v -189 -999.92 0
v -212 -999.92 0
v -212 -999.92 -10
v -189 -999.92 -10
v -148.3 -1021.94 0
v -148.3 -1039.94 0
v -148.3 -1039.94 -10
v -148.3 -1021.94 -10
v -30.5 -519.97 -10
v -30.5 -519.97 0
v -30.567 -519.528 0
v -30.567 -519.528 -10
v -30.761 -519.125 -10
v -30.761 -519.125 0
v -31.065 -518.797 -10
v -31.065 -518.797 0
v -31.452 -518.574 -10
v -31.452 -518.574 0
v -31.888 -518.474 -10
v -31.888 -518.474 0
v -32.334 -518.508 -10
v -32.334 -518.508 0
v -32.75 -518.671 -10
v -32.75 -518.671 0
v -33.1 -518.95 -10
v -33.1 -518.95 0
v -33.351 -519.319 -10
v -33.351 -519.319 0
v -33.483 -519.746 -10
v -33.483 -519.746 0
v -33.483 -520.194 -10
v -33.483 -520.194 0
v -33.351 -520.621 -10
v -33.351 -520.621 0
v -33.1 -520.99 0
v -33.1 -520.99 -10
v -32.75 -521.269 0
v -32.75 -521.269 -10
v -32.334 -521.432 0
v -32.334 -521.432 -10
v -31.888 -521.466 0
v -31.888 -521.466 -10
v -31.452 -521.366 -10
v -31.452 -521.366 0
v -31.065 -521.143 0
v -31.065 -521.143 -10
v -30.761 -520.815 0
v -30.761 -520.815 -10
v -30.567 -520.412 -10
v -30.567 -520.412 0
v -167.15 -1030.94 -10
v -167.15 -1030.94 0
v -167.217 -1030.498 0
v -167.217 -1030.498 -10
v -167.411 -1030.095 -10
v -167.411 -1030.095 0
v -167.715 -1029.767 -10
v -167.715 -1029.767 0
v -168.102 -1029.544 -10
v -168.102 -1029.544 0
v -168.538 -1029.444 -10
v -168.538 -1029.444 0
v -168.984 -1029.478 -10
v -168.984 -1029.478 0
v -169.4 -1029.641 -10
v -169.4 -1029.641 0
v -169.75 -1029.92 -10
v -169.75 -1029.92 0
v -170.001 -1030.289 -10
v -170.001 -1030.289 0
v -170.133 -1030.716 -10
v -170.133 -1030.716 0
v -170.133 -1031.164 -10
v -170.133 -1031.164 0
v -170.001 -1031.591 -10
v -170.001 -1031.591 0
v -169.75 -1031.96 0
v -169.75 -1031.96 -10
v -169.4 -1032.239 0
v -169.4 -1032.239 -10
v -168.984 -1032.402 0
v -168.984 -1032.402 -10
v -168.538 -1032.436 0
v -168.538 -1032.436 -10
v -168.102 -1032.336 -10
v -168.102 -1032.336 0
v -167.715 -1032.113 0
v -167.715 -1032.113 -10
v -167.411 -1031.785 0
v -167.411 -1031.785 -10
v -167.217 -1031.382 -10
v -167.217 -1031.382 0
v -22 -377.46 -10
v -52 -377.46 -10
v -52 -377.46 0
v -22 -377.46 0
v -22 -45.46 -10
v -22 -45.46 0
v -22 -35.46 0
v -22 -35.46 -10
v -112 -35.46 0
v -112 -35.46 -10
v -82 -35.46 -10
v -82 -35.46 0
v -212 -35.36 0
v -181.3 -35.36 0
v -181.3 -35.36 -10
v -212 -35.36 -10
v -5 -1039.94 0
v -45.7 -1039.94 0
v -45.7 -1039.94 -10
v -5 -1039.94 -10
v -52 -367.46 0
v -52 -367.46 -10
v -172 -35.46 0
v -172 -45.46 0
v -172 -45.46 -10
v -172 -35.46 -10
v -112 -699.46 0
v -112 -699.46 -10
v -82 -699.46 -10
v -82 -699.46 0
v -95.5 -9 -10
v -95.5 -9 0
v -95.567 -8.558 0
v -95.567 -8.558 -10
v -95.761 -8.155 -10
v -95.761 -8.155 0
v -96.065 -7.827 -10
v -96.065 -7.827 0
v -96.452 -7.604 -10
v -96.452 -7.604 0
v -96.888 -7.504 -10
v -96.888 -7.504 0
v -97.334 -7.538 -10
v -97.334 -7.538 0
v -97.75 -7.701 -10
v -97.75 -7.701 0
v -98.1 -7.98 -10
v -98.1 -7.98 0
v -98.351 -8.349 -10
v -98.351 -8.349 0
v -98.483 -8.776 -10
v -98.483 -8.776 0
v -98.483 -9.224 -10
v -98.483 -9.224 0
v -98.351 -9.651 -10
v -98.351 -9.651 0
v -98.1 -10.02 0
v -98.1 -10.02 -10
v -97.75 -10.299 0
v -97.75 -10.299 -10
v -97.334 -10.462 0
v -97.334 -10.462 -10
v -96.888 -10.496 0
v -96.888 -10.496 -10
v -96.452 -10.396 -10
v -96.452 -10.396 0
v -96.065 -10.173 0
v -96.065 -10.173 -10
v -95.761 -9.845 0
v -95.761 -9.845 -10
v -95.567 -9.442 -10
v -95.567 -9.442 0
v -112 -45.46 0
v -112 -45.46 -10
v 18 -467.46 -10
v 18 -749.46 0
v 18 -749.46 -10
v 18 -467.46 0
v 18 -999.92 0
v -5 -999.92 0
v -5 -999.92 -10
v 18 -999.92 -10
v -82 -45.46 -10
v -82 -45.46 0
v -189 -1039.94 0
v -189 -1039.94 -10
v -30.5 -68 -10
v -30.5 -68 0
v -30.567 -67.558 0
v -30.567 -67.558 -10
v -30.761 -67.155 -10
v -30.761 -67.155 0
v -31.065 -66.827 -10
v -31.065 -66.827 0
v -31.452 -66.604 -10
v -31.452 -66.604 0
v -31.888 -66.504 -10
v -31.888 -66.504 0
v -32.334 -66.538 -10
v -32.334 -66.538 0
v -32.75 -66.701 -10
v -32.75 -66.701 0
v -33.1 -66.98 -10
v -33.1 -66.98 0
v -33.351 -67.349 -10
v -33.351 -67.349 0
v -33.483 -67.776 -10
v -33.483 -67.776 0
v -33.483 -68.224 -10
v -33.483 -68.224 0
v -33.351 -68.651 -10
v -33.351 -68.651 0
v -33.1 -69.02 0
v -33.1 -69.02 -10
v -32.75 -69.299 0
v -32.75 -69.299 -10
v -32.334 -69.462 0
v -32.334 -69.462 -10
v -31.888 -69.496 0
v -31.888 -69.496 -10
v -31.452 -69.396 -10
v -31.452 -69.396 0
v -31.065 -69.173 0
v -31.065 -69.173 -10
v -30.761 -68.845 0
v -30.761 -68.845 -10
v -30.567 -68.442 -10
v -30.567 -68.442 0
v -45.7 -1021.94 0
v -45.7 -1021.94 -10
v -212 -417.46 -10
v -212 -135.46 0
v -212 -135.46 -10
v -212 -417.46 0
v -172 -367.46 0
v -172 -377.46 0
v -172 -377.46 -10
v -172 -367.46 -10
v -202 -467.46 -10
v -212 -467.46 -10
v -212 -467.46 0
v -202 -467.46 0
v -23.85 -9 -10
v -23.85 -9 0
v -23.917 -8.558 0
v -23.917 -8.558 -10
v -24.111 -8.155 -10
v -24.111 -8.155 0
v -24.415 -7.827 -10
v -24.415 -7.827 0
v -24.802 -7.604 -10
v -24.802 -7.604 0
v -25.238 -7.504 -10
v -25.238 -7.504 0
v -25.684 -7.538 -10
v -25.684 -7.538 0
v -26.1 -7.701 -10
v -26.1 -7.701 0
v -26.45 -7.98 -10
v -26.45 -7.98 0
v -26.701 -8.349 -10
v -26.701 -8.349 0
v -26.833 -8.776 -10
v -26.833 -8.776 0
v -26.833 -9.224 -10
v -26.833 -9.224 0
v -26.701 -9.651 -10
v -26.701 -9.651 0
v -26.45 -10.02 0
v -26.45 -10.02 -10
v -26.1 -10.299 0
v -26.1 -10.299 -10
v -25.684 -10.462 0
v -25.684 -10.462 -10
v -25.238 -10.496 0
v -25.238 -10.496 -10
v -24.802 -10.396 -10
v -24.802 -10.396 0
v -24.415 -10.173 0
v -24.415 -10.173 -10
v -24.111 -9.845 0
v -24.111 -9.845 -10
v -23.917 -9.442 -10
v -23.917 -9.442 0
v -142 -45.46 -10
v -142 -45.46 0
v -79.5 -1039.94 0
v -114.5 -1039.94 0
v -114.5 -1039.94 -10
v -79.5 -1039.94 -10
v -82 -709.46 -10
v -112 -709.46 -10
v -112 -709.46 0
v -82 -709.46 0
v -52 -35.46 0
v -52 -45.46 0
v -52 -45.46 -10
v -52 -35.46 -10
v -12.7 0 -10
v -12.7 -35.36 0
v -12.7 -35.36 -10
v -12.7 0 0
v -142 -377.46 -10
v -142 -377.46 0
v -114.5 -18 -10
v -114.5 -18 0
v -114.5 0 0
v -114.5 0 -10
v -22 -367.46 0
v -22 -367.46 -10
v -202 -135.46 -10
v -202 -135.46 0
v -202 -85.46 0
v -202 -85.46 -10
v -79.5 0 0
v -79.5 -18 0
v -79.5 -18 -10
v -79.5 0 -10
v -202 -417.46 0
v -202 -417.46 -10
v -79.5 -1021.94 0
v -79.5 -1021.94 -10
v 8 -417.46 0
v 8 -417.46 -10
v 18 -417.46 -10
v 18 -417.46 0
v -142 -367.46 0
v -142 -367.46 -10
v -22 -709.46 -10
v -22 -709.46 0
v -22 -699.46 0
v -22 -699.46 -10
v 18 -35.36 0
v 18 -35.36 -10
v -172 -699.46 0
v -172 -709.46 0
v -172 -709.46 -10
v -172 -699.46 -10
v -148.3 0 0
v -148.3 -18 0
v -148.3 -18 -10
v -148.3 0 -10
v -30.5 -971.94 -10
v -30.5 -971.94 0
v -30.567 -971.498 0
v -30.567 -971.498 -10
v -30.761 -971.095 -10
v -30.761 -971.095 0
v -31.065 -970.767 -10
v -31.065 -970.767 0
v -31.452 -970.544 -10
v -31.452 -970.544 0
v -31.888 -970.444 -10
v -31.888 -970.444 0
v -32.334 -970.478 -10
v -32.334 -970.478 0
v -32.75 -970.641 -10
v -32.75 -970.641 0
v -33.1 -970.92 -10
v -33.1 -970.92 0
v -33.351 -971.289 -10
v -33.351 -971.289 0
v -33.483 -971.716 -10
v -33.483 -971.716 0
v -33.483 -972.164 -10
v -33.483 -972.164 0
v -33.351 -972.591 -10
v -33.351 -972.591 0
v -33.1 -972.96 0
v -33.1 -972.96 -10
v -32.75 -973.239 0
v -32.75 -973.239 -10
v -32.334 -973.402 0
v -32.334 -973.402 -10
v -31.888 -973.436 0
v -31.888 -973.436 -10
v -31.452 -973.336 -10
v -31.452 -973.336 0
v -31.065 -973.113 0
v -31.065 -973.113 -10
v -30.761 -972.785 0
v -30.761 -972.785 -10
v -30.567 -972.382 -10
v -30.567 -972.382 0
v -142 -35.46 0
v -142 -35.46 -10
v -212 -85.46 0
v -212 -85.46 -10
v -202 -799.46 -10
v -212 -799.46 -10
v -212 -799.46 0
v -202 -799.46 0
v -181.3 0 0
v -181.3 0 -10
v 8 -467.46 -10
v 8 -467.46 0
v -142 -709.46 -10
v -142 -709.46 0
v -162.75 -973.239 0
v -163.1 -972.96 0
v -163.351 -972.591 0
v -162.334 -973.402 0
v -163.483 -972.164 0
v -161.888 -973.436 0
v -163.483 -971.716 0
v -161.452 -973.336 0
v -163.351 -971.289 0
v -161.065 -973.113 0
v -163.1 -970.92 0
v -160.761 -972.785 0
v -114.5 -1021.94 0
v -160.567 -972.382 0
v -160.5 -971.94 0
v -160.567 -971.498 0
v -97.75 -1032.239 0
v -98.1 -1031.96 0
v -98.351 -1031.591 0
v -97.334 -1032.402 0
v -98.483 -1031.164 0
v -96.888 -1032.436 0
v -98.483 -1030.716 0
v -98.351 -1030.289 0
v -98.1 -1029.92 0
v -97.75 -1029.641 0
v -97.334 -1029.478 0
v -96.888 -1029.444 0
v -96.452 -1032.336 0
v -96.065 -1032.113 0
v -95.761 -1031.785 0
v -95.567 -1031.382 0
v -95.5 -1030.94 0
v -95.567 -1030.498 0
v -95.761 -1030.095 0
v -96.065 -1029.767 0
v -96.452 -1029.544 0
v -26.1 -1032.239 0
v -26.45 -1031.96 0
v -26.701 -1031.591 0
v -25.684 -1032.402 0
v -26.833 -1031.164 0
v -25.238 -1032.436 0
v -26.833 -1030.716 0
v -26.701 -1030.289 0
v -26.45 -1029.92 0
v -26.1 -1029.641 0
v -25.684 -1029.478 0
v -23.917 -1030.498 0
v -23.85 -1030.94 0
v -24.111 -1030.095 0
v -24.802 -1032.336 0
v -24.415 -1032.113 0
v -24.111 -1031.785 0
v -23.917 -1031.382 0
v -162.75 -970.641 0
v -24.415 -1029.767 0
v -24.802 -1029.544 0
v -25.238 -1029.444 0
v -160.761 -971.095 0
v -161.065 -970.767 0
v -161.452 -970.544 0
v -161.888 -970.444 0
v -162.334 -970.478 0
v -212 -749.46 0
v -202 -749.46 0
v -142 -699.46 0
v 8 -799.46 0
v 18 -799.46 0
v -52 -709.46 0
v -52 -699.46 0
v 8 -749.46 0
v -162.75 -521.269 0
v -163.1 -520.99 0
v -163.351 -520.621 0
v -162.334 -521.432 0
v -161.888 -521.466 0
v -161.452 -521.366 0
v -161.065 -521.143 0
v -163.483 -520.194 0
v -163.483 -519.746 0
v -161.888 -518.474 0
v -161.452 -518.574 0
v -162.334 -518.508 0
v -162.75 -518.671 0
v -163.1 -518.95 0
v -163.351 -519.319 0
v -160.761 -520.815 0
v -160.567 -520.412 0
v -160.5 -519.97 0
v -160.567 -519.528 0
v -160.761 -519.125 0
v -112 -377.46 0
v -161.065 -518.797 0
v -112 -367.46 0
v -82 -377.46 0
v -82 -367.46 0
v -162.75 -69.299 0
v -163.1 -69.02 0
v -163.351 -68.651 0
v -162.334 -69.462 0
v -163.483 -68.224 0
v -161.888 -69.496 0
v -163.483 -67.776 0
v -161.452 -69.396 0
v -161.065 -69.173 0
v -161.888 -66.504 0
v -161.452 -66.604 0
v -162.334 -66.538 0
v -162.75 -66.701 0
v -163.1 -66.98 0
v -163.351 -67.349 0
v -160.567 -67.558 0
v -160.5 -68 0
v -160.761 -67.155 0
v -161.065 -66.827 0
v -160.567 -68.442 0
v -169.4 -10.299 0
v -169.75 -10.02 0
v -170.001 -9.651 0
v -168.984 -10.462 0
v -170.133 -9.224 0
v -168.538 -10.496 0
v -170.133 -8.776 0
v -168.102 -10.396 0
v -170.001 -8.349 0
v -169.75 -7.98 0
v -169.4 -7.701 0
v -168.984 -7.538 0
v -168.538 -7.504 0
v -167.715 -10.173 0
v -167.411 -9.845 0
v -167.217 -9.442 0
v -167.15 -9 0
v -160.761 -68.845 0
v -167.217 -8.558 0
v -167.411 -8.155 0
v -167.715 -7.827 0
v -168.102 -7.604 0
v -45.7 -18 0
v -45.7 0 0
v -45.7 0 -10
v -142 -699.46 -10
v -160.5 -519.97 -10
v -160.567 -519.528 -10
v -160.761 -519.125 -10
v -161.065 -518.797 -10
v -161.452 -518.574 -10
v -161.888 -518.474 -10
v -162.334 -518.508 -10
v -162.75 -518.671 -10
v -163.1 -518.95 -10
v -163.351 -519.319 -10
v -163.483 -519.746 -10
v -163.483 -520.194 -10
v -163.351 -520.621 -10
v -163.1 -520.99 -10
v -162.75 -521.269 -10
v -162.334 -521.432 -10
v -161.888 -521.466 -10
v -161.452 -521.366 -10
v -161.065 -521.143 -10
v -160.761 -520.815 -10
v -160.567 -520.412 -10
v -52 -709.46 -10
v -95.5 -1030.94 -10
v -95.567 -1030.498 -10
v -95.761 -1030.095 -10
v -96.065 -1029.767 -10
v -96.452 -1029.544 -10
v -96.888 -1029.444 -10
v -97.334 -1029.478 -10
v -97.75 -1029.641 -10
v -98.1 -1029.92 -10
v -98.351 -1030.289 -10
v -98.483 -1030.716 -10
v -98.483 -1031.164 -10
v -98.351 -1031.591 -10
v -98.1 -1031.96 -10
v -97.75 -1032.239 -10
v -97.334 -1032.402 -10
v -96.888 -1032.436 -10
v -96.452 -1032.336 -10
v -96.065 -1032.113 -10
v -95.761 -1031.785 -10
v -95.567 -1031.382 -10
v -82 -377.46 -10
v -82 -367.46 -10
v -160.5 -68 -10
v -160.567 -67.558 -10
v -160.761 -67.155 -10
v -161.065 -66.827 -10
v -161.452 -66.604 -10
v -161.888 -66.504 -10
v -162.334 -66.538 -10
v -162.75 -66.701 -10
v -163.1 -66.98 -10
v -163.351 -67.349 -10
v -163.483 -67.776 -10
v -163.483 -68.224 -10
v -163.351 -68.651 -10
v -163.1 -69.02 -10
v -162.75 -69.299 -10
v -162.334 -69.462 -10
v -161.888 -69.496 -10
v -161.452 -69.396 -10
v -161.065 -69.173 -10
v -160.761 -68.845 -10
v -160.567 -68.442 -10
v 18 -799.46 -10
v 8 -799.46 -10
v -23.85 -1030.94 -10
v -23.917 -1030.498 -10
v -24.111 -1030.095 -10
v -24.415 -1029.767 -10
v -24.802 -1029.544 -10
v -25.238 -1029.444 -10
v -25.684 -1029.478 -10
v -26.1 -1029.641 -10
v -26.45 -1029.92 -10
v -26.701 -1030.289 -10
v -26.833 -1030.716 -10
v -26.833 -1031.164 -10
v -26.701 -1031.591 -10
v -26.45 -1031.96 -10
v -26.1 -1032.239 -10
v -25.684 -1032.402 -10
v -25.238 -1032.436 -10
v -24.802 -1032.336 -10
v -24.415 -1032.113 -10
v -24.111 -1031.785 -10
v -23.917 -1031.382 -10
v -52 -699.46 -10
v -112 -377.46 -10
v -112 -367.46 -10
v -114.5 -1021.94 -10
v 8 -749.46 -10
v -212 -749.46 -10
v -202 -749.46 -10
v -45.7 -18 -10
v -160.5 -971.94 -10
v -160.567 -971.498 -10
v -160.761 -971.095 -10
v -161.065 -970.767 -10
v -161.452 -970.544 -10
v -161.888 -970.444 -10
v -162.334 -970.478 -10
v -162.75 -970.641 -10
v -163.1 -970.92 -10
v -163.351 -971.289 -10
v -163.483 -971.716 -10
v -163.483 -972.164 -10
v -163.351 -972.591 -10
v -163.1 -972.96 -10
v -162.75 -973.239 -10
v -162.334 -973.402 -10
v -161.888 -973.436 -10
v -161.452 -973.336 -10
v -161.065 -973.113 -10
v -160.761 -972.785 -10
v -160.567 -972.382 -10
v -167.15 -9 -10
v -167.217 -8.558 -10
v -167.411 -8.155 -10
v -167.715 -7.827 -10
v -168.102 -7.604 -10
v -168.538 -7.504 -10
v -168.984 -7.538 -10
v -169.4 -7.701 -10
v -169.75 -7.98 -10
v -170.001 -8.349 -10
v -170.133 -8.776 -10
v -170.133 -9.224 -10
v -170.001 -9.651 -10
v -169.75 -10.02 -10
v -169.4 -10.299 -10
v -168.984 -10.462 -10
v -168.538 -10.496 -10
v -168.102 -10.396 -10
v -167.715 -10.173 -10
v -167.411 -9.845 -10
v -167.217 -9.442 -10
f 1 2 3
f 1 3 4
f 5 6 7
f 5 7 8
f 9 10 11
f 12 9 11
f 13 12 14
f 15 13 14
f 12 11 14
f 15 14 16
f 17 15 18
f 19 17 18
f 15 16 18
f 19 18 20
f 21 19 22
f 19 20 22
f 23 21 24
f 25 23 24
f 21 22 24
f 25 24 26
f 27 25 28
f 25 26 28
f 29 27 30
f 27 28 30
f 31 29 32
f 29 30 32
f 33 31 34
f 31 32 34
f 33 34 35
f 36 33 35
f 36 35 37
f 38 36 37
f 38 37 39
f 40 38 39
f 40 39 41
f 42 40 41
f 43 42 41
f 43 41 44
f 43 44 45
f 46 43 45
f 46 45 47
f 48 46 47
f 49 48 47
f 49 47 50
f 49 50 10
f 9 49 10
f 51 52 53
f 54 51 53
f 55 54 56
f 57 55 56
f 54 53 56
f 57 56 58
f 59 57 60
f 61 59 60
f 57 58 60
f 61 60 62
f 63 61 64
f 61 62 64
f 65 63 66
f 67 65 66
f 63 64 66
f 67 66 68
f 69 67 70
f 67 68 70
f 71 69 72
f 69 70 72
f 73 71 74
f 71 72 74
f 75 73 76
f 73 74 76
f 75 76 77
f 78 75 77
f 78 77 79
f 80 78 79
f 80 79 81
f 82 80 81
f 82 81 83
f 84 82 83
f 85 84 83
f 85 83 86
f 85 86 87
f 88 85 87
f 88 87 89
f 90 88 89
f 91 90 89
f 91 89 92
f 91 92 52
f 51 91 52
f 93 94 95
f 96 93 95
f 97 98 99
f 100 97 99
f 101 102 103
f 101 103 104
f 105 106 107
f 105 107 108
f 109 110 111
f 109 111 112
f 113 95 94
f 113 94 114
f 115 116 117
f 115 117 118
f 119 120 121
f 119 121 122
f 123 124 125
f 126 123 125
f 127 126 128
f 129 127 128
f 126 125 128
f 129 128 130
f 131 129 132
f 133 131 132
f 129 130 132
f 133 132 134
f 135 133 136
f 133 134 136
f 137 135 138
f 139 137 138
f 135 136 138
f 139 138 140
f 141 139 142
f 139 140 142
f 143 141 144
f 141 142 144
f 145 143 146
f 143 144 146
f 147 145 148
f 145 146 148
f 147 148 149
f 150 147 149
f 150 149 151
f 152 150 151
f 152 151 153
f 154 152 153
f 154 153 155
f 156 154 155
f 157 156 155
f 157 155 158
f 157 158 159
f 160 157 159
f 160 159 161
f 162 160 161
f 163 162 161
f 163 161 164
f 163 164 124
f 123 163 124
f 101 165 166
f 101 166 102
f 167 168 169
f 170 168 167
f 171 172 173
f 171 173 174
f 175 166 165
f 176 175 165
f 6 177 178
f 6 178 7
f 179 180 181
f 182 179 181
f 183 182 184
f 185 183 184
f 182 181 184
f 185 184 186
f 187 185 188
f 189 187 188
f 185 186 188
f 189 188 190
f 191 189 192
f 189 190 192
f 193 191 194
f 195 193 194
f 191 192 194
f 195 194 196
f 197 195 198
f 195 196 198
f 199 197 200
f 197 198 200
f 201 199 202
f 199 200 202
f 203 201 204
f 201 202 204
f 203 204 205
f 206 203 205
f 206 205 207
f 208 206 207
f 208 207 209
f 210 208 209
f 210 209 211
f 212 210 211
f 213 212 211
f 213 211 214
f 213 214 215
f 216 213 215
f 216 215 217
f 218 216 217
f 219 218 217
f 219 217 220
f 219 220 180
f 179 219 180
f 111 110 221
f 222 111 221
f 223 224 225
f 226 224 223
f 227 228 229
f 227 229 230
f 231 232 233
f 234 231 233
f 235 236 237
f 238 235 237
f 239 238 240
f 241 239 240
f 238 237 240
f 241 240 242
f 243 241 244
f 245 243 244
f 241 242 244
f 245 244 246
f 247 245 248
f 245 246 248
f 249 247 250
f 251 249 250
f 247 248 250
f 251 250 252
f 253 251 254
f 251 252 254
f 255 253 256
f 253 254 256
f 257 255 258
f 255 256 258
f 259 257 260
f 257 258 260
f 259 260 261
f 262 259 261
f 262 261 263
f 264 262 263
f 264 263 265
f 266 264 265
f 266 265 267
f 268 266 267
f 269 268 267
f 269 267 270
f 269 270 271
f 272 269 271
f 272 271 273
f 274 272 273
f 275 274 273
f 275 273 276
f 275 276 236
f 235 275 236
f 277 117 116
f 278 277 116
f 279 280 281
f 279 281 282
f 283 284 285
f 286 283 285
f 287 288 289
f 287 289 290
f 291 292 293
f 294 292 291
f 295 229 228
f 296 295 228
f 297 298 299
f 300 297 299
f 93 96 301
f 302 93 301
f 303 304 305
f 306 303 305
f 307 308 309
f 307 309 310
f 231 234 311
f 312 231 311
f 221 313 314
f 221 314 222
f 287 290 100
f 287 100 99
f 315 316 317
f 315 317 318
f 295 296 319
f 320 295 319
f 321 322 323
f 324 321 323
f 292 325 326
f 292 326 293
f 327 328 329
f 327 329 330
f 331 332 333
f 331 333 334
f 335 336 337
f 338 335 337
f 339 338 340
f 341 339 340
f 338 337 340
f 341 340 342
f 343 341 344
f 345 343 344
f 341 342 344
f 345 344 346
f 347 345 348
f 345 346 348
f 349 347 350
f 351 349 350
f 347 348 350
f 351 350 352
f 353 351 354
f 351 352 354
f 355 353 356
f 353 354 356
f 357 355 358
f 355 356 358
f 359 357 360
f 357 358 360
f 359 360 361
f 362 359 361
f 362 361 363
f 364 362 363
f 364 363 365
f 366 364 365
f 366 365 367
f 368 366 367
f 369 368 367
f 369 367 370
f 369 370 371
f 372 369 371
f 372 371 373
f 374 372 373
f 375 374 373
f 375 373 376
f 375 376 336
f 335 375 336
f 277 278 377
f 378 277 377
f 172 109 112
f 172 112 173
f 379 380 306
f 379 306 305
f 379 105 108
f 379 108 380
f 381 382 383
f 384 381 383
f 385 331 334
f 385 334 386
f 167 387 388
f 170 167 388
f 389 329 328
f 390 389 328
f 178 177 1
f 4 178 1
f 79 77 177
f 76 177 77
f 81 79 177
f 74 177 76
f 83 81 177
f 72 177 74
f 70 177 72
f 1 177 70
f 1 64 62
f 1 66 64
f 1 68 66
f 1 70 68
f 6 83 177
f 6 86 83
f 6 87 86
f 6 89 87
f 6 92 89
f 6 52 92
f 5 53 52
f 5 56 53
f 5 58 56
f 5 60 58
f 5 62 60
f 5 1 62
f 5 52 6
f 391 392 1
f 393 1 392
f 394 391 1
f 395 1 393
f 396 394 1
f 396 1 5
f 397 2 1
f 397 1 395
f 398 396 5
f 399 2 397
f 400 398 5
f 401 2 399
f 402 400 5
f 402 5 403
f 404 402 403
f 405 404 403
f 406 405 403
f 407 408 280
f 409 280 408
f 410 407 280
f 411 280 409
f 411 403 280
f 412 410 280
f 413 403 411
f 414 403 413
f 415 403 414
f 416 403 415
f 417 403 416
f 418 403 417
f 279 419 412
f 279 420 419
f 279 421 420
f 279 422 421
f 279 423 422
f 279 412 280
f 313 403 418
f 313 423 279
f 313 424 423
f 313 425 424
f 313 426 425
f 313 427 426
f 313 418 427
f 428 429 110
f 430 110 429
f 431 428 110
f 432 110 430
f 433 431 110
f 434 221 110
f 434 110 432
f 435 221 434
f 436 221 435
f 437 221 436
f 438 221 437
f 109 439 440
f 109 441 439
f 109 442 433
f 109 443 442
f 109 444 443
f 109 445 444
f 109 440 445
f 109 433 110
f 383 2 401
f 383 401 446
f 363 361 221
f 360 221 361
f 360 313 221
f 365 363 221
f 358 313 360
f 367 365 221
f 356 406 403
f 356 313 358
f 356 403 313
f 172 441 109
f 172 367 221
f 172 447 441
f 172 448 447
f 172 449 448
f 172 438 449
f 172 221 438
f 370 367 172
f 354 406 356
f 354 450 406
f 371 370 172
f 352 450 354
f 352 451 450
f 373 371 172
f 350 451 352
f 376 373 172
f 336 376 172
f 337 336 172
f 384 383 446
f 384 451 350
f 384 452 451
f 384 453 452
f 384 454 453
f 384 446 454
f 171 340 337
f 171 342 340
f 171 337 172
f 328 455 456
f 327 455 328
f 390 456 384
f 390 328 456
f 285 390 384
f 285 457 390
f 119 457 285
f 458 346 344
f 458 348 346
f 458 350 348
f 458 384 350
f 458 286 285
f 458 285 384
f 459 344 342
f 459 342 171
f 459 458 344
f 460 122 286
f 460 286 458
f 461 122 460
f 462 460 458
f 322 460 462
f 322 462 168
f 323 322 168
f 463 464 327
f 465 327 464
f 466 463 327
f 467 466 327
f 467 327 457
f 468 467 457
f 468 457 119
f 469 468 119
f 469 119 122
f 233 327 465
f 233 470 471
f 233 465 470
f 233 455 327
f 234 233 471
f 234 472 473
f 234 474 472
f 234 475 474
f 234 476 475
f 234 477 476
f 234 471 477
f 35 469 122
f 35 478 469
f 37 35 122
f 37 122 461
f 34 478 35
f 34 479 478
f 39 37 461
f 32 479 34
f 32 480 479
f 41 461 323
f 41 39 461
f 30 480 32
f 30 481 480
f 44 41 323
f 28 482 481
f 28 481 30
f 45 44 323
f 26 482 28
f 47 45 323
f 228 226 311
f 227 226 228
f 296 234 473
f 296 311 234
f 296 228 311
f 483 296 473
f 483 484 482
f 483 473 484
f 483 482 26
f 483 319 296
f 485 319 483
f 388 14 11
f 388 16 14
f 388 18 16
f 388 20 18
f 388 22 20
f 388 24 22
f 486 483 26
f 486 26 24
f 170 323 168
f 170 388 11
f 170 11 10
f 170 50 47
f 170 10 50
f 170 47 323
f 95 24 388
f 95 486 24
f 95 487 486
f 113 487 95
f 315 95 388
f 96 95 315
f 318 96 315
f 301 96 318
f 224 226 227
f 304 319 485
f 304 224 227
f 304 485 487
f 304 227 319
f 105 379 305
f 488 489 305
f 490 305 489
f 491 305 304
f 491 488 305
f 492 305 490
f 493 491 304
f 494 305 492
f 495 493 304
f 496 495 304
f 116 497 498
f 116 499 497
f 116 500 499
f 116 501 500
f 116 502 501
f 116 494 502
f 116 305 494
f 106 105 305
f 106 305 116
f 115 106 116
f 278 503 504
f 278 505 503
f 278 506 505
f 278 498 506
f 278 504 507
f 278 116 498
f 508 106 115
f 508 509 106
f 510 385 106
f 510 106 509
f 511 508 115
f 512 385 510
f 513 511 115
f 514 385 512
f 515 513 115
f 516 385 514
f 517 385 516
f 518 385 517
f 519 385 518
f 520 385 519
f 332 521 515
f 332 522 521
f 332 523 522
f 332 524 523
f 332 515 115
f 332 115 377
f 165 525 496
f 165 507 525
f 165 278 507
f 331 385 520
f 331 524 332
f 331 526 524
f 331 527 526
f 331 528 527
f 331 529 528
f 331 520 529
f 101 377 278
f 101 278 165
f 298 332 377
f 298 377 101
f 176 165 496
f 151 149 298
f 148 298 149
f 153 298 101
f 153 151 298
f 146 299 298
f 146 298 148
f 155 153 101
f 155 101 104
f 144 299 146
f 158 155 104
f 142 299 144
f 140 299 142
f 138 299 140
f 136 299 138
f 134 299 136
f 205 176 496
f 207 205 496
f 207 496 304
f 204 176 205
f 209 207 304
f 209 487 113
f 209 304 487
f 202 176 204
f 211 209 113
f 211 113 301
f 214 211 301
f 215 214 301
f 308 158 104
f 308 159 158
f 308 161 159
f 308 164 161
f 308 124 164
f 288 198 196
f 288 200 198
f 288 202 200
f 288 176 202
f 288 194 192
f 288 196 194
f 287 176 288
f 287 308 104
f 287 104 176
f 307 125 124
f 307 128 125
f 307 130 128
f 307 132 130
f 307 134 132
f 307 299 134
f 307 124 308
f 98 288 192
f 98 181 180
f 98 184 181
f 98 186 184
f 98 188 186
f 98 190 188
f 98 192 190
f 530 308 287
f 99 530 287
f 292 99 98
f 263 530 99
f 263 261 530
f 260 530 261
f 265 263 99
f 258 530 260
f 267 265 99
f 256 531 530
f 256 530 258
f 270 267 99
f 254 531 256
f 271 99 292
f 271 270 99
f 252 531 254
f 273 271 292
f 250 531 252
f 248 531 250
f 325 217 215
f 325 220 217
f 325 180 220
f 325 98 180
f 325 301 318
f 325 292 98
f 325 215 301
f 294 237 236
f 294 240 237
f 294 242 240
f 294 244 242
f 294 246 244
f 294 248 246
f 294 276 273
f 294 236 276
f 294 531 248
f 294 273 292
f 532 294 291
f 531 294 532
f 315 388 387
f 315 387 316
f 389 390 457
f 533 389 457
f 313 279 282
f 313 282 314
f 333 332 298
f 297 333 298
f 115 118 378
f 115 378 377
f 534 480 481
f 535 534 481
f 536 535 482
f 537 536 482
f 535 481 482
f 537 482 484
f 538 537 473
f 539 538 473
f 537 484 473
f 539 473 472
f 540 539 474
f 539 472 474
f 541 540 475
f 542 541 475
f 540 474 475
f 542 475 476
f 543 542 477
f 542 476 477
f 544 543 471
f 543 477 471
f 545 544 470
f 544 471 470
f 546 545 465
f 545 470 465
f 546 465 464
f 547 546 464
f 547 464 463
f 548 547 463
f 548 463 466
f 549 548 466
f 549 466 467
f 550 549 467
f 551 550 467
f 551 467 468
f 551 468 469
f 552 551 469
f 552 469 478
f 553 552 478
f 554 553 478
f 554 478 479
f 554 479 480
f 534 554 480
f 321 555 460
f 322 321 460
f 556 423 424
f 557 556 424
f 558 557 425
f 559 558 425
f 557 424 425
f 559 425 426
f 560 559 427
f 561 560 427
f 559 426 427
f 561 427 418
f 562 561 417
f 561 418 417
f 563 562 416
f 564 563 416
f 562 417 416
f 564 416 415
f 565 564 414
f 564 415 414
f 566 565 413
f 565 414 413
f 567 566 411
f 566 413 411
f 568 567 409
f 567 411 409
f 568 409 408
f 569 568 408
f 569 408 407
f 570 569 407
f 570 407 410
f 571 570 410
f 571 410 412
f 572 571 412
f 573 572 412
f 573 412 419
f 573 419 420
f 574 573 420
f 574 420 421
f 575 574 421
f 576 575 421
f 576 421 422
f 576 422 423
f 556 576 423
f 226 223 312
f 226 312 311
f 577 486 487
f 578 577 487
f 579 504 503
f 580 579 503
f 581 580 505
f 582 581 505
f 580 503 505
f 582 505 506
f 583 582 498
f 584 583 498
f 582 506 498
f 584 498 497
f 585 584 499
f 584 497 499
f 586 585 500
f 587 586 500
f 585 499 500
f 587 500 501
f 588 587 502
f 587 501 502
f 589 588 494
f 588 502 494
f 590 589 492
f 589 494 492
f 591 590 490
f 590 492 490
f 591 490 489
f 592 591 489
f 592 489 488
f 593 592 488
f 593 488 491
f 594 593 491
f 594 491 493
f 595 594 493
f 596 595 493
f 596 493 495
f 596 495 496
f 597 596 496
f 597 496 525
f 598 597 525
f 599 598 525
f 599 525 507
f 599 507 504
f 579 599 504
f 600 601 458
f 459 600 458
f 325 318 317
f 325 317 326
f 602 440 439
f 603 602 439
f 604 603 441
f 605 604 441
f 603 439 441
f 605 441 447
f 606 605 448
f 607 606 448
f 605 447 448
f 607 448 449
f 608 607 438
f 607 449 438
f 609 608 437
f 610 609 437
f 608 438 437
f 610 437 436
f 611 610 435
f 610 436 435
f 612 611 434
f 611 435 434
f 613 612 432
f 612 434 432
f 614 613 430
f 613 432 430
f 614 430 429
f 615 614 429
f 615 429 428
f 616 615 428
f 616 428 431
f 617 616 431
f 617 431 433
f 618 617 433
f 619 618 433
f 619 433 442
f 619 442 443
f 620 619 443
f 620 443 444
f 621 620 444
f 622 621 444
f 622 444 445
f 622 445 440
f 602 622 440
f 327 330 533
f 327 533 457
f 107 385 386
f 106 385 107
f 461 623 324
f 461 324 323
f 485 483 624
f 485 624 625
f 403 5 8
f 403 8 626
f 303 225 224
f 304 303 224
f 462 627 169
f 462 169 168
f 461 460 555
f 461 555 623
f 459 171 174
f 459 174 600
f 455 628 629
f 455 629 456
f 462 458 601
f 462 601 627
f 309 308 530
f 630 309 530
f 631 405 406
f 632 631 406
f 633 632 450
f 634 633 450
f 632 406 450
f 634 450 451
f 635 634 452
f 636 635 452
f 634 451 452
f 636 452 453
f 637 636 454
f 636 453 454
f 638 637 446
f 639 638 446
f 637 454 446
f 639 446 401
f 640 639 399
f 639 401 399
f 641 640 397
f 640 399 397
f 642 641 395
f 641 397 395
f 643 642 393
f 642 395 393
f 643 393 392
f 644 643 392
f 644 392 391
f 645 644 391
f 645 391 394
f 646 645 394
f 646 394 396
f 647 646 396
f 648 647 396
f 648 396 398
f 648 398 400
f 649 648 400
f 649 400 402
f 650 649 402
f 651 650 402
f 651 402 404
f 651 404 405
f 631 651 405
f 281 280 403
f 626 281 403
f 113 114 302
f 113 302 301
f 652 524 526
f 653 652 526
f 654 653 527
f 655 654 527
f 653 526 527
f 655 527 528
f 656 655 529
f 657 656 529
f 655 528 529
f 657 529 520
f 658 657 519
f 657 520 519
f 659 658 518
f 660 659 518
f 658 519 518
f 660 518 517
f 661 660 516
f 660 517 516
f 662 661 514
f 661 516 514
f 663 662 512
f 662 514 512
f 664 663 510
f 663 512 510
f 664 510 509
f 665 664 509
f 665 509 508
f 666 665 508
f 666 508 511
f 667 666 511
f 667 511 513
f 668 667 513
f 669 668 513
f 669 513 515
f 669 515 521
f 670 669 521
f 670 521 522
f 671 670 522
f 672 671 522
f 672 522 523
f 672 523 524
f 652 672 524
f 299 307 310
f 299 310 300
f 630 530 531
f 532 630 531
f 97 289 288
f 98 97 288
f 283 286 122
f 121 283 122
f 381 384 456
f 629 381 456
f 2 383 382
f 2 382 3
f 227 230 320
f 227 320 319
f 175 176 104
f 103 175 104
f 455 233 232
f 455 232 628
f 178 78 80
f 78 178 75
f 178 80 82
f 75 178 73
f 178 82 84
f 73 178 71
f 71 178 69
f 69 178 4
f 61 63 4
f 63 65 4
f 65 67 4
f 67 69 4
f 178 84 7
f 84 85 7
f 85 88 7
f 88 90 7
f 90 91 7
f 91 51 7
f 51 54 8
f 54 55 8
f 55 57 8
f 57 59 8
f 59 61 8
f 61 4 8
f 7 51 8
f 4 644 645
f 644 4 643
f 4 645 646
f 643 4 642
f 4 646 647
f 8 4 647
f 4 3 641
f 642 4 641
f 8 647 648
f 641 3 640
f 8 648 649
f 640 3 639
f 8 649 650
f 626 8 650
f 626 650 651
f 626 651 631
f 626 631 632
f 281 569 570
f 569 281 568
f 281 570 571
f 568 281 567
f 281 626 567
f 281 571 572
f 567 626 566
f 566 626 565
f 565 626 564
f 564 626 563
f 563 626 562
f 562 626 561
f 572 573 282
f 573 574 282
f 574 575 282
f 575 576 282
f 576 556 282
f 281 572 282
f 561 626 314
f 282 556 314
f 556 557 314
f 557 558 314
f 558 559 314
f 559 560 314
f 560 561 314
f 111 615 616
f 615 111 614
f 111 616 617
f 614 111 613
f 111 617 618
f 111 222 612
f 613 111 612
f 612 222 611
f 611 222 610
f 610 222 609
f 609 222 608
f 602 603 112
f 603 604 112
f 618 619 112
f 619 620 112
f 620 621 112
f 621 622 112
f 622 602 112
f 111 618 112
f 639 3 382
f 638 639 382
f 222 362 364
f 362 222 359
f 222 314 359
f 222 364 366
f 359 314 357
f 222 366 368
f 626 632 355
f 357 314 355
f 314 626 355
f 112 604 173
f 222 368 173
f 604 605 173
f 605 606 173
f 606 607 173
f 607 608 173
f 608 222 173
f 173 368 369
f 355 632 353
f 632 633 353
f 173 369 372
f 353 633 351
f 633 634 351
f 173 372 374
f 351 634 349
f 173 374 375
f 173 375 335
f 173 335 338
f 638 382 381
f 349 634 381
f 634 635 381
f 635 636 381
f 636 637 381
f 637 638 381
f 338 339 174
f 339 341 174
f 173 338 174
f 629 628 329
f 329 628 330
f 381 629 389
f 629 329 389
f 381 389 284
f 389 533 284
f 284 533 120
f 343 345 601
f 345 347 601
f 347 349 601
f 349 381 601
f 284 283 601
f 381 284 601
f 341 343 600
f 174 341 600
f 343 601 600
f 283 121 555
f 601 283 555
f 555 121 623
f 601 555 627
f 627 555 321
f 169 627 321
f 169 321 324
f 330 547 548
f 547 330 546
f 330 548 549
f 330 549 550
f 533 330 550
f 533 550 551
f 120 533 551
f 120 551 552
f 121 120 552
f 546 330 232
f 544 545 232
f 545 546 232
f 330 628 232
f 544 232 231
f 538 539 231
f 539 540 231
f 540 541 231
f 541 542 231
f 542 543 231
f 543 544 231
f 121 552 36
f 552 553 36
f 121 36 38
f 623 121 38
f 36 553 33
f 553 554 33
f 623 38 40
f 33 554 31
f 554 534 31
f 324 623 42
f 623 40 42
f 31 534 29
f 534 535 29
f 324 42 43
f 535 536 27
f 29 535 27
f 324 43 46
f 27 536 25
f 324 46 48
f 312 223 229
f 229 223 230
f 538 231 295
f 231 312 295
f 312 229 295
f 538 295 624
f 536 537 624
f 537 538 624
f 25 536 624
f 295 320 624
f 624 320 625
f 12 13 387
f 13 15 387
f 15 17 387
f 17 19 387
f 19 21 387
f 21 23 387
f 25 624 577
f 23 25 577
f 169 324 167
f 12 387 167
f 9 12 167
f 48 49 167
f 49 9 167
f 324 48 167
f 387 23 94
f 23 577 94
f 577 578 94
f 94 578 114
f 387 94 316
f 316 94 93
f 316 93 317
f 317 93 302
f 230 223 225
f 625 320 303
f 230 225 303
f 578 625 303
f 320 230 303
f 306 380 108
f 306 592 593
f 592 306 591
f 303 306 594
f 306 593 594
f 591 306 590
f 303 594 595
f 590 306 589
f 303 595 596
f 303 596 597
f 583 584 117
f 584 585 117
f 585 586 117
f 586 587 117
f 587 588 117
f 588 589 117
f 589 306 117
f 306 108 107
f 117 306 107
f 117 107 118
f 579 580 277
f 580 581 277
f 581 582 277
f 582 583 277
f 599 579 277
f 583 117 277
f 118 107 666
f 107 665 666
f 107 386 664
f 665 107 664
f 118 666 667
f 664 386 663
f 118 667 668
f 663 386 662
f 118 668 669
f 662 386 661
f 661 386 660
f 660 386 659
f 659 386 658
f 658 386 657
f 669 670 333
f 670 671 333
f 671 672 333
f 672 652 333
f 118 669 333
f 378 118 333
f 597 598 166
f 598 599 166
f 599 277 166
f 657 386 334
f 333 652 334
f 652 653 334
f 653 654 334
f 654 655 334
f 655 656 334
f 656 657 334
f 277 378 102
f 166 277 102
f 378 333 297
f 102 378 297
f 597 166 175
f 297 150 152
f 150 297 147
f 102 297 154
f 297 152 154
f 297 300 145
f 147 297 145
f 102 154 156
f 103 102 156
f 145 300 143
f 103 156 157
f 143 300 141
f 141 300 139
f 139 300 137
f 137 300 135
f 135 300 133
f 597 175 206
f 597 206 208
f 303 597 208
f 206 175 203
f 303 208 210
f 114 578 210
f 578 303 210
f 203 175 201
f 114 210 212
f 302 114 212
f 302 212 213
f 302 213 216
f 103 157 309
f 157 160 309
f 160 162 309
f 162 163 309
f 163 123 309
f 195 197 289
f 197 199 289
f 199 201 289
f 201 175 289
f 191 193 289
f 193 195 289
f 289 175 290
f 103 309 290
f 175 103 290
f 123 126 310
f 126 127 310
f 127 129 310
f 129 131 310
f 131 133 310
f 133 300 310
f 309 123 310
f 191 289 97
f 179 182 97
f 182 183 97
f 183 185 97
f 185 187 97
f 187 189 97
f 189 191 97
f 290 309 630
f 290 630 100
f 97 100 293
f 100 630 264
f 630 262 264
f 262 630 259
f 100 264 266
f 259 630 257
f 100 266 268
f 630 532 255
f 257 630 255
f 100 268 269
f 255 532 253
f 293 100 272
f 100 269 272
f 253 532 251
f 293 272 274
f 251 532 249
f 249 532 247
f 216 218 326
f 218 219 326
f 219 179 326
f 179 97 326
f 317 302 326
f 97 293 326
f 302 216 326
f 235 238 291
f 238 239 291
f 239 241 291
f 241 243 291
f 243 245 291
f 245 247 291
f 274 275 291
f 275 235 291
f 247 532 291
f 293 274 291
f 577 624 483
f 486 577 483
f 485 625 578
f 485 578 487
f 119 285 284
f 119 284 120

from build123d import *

# Parameters (mm, degrees)
BOSS_EXTRUDE1_DEPTH          = 10
SKETCH2_W                    = 33.8
SKETCH2_H                    = 18
CUT_EXTRUDE1_DEPTH           = 38
SKETCH3_W                    = 23
SKETCH3_H                    = 40.02
CUT_EXTRUDE2_DEPTH           = 51
CAVITY1_START                = -212
CAVITY1_OUTLINE_W            = 50
CAVITY1_OUTLINE_H            = 10
CAVITY1_DEPTH                = 10
CAVITY1_START_2              = 8
CAVITY1_2_OUTLINE_W          = 50
CAVITY1_2_OUTLINE_H          = 10
CAVITY1_2_DEPTH              = 10
CAVITY1_START_3              = -172
CAVITY1_3_OUTLINE_W          = 10
CAVITY1_3_OUTLINE_H          = 10
CAVITY1_3_DEPTH              = 30
CAVITY1_START_4              = -112
CAVITY1_4_OUTLINE_W          = 10
CAVITY1_4_OUTLINE_H          = 10
CAVITY1_4_DEPTH              = 30
CAVITY1_START_5              = -52
CAVITY1_5_OUTLINE_W          = 10
CAVITY1_5_OUTLINE_H          = 10
CAVITY1_5_DEPTH              = 30
F_3_0_3_DIAMETER_HOLE1_D     = 3
F_3_0_3_DIAMETER_HOLE1_DEPTH = 15
F_3_0_3_DIAMETER_HOLE1_TIP   = 0.901290929


# Read off the part's stored shape, not the designer's step: Cavity1
with BuildPart() as part:
    # Sketch1 → Boss-Extrude1 (new body)
    with BuildSketch(Plane.XY):
        Polygon((18, -35.36), (-12.7, -35.36), (-12.7, 0), (-181.3, 0), (-181.3, -35.36), (-212, -35.36), (-212, -1039.94), (18, -1039.94), align=None)
    extrude(amount=-BOSS_EXTRUDE1_DEPTH)

    # Sketch2 → Cut-Extrude1 (cut)
    with BuildSketch(Plane.XY):
        with Locations((-62.6, -9)):
            Rectangle(SKETCH2_W, SKETCH2_H)
        with Locations((-131.4, -9)):
            Rectangle(SKETCH2_W, SKETCH2_H)
        with Locations((-131.4, -1030.94)):
            Rectangle(SKETCH2_W, SKETCH2_H)
        with Locations((-62.6, -1030.94)):
            Rectangle(SKETCH2_W, SKETCH2_H)
    extrude(amount=-CUT_EXTRUDE1_DEPTH, mode=Mode.SUBTRACT)

    # Sketch3 → Cut-Extrude2 (cut)
    with BuildSketch(Plane.XY):
        with Locations((-200.5, -1019.93)):
            Rectangle(SKETCH3_W, SKETCH3_H)
        with Locations((6.5, -1019.93)):
            Rectangle(SKETCH3_W, SKETCH3_H)
    extrude(amount=-CUT_EXTRUDE2_DEPTH, mode=Mode.SUBTRACT)

    # Cavity1 outline → Cavity1 (cut)
    with BuildSketch(Plane.YZ.offset(CAVITY1_START)):
        with Locations((-110.46, -5)):
            Rectangle(CAVITY1_OUTLINE_W, CAVITY1_OUTLINE_H)
        with Locations((-442.46, -5)):
            Rectangle(CAVITY1_OUTLINE_W, CAVITY1_OUTLINE_H)
        with Locations((-774.46, -5)):
            Rectangle(CAVITY1_OUTLINE_W, CAVITY1_OUTLINE_H)
    extrude(amount=CAVITY1_DEPTH, mode=Mode.SUBTRACT)

    # Cavity1 2 outline → Cavity1 2 (cut)
    with BuildSketch(Plane.YZ.offset(CAVITY1_START_2)):
        with Locations((-442.46, -5)):
            Rectangle(CAVITY1_2_OUTLINE_W, CAVITY1_2_OUTLINE_H)
        with Locations((-774.46, -5)):
            Rectangle(CAVITY1_2_OUTLINE_W, CAVITY1_2_OUTLINE_H)
    extrude(amount=CAVITY1_2_DEPTH, mode=Mode.SUBTRACT)

    # Cavity1 3 outline → Cavity1 3 (cut)
    with BuildSketch(Plane.YZ.offset(CAVITY1_START_3)):
        with Locations((-40.46, -5)):
            Rectangle(CAVITY1_3_OUTLINE_W, CAVITY1_3_OUTLINE_H)
        with Locations((-372.46, -5)):
            Rectangle(CAVITY1_3_OUTLINE_W, CAVITY1_3_OUTLINE_H)
        with Locations((-704.46, -5)):
            Rectangle(CAVITY1_3_OUTLINE_W, CAVITY1_3_OUTLINE_H)
    extrude(amount=CAVITY1_3_DEPTH, mode=Mode.SUBTRACT)

    # Cavity1 4 outline → Cavity1 4 (cut)
    with BuildSketch(Plane.YZ.offset(CAVITY1_START_4)):
        with Locations((-40.46, -5)):
            Rectangle(CAVITY1_4_OUTLINE_W, CAVITY1_4_OUTLINE_H)
        with Locations((-372.46, -5)):
            Rectangle(CAVITY1_4_OUTLINE_W, CAVITY1_4_OUTLINE_H)
        with Locations((-704.46, -5)):
            Rectangle(CAVITY1_4_OUTLINE_W, CAVITY1_4_OUTLINE_H)
    extrude(amount=CAVITY1_4_DEPTH, mode=Mode.SUBTRACT)

    # Cavity1 5 outline → Cavity1 5 (cut)
    with BuildSketch(Plane.YZ.offset(CAVITY1_START_5)):
        with Locations((-40.46, -5)):
            Rectangle(CAVITY1_5_OUTLINE_W, CAVITY1_5_OUTLINE_H)
        with Locations((-372.46, -5)):
            Rectangle(CAVITY1_5_OUTLINE_W, CAVITY1_5_OUTLINE_H)
        with Locations((-704.46, -5)):
            Rectangle(CAVITY1_5_OUTLINE_W, CAVITY1_5_OUTLINE_H)
    extrude(amount=CAVITY1_5_DEPTH, mode=Mode.SUBTRACT)

    # Ø3.0 (3) Diameter Hole1
    with Locations(Plane(origin=(0, 0, -10), x_dir=(-1, 0, 0), z_dir=(0, 0, -1))):
        with Locations((162, -971.94), (32, -68), (162, -68), (32, -971.94), (32, -519.97), (162, -519.97), (97, -1030.94), (168.65, -1030.94), (25.35, -1030.94), (25.35, -9), (168.65, -9), (97, -9)):
            Hole(F_3_0_3_DIAMETER_HOLE1_D / 2, depth=F_3_0_3_DIAMETER_HOLE1_DEPTH)
            with Locations((0, 0, -(F_3_0_3_DIAMETER_HOLE1_DEPTH + F_3_0_3_DIAMETER_HOLE1_TIP / 2))):  # 118° drill point
                Cone(0, F_3_0_3_DIAMETER_HOLE1_D / 2, F_3_0_3_DIAMETER_HOLE1_TIP, mode=Mode.SUBTRACT)


solid = part.part
